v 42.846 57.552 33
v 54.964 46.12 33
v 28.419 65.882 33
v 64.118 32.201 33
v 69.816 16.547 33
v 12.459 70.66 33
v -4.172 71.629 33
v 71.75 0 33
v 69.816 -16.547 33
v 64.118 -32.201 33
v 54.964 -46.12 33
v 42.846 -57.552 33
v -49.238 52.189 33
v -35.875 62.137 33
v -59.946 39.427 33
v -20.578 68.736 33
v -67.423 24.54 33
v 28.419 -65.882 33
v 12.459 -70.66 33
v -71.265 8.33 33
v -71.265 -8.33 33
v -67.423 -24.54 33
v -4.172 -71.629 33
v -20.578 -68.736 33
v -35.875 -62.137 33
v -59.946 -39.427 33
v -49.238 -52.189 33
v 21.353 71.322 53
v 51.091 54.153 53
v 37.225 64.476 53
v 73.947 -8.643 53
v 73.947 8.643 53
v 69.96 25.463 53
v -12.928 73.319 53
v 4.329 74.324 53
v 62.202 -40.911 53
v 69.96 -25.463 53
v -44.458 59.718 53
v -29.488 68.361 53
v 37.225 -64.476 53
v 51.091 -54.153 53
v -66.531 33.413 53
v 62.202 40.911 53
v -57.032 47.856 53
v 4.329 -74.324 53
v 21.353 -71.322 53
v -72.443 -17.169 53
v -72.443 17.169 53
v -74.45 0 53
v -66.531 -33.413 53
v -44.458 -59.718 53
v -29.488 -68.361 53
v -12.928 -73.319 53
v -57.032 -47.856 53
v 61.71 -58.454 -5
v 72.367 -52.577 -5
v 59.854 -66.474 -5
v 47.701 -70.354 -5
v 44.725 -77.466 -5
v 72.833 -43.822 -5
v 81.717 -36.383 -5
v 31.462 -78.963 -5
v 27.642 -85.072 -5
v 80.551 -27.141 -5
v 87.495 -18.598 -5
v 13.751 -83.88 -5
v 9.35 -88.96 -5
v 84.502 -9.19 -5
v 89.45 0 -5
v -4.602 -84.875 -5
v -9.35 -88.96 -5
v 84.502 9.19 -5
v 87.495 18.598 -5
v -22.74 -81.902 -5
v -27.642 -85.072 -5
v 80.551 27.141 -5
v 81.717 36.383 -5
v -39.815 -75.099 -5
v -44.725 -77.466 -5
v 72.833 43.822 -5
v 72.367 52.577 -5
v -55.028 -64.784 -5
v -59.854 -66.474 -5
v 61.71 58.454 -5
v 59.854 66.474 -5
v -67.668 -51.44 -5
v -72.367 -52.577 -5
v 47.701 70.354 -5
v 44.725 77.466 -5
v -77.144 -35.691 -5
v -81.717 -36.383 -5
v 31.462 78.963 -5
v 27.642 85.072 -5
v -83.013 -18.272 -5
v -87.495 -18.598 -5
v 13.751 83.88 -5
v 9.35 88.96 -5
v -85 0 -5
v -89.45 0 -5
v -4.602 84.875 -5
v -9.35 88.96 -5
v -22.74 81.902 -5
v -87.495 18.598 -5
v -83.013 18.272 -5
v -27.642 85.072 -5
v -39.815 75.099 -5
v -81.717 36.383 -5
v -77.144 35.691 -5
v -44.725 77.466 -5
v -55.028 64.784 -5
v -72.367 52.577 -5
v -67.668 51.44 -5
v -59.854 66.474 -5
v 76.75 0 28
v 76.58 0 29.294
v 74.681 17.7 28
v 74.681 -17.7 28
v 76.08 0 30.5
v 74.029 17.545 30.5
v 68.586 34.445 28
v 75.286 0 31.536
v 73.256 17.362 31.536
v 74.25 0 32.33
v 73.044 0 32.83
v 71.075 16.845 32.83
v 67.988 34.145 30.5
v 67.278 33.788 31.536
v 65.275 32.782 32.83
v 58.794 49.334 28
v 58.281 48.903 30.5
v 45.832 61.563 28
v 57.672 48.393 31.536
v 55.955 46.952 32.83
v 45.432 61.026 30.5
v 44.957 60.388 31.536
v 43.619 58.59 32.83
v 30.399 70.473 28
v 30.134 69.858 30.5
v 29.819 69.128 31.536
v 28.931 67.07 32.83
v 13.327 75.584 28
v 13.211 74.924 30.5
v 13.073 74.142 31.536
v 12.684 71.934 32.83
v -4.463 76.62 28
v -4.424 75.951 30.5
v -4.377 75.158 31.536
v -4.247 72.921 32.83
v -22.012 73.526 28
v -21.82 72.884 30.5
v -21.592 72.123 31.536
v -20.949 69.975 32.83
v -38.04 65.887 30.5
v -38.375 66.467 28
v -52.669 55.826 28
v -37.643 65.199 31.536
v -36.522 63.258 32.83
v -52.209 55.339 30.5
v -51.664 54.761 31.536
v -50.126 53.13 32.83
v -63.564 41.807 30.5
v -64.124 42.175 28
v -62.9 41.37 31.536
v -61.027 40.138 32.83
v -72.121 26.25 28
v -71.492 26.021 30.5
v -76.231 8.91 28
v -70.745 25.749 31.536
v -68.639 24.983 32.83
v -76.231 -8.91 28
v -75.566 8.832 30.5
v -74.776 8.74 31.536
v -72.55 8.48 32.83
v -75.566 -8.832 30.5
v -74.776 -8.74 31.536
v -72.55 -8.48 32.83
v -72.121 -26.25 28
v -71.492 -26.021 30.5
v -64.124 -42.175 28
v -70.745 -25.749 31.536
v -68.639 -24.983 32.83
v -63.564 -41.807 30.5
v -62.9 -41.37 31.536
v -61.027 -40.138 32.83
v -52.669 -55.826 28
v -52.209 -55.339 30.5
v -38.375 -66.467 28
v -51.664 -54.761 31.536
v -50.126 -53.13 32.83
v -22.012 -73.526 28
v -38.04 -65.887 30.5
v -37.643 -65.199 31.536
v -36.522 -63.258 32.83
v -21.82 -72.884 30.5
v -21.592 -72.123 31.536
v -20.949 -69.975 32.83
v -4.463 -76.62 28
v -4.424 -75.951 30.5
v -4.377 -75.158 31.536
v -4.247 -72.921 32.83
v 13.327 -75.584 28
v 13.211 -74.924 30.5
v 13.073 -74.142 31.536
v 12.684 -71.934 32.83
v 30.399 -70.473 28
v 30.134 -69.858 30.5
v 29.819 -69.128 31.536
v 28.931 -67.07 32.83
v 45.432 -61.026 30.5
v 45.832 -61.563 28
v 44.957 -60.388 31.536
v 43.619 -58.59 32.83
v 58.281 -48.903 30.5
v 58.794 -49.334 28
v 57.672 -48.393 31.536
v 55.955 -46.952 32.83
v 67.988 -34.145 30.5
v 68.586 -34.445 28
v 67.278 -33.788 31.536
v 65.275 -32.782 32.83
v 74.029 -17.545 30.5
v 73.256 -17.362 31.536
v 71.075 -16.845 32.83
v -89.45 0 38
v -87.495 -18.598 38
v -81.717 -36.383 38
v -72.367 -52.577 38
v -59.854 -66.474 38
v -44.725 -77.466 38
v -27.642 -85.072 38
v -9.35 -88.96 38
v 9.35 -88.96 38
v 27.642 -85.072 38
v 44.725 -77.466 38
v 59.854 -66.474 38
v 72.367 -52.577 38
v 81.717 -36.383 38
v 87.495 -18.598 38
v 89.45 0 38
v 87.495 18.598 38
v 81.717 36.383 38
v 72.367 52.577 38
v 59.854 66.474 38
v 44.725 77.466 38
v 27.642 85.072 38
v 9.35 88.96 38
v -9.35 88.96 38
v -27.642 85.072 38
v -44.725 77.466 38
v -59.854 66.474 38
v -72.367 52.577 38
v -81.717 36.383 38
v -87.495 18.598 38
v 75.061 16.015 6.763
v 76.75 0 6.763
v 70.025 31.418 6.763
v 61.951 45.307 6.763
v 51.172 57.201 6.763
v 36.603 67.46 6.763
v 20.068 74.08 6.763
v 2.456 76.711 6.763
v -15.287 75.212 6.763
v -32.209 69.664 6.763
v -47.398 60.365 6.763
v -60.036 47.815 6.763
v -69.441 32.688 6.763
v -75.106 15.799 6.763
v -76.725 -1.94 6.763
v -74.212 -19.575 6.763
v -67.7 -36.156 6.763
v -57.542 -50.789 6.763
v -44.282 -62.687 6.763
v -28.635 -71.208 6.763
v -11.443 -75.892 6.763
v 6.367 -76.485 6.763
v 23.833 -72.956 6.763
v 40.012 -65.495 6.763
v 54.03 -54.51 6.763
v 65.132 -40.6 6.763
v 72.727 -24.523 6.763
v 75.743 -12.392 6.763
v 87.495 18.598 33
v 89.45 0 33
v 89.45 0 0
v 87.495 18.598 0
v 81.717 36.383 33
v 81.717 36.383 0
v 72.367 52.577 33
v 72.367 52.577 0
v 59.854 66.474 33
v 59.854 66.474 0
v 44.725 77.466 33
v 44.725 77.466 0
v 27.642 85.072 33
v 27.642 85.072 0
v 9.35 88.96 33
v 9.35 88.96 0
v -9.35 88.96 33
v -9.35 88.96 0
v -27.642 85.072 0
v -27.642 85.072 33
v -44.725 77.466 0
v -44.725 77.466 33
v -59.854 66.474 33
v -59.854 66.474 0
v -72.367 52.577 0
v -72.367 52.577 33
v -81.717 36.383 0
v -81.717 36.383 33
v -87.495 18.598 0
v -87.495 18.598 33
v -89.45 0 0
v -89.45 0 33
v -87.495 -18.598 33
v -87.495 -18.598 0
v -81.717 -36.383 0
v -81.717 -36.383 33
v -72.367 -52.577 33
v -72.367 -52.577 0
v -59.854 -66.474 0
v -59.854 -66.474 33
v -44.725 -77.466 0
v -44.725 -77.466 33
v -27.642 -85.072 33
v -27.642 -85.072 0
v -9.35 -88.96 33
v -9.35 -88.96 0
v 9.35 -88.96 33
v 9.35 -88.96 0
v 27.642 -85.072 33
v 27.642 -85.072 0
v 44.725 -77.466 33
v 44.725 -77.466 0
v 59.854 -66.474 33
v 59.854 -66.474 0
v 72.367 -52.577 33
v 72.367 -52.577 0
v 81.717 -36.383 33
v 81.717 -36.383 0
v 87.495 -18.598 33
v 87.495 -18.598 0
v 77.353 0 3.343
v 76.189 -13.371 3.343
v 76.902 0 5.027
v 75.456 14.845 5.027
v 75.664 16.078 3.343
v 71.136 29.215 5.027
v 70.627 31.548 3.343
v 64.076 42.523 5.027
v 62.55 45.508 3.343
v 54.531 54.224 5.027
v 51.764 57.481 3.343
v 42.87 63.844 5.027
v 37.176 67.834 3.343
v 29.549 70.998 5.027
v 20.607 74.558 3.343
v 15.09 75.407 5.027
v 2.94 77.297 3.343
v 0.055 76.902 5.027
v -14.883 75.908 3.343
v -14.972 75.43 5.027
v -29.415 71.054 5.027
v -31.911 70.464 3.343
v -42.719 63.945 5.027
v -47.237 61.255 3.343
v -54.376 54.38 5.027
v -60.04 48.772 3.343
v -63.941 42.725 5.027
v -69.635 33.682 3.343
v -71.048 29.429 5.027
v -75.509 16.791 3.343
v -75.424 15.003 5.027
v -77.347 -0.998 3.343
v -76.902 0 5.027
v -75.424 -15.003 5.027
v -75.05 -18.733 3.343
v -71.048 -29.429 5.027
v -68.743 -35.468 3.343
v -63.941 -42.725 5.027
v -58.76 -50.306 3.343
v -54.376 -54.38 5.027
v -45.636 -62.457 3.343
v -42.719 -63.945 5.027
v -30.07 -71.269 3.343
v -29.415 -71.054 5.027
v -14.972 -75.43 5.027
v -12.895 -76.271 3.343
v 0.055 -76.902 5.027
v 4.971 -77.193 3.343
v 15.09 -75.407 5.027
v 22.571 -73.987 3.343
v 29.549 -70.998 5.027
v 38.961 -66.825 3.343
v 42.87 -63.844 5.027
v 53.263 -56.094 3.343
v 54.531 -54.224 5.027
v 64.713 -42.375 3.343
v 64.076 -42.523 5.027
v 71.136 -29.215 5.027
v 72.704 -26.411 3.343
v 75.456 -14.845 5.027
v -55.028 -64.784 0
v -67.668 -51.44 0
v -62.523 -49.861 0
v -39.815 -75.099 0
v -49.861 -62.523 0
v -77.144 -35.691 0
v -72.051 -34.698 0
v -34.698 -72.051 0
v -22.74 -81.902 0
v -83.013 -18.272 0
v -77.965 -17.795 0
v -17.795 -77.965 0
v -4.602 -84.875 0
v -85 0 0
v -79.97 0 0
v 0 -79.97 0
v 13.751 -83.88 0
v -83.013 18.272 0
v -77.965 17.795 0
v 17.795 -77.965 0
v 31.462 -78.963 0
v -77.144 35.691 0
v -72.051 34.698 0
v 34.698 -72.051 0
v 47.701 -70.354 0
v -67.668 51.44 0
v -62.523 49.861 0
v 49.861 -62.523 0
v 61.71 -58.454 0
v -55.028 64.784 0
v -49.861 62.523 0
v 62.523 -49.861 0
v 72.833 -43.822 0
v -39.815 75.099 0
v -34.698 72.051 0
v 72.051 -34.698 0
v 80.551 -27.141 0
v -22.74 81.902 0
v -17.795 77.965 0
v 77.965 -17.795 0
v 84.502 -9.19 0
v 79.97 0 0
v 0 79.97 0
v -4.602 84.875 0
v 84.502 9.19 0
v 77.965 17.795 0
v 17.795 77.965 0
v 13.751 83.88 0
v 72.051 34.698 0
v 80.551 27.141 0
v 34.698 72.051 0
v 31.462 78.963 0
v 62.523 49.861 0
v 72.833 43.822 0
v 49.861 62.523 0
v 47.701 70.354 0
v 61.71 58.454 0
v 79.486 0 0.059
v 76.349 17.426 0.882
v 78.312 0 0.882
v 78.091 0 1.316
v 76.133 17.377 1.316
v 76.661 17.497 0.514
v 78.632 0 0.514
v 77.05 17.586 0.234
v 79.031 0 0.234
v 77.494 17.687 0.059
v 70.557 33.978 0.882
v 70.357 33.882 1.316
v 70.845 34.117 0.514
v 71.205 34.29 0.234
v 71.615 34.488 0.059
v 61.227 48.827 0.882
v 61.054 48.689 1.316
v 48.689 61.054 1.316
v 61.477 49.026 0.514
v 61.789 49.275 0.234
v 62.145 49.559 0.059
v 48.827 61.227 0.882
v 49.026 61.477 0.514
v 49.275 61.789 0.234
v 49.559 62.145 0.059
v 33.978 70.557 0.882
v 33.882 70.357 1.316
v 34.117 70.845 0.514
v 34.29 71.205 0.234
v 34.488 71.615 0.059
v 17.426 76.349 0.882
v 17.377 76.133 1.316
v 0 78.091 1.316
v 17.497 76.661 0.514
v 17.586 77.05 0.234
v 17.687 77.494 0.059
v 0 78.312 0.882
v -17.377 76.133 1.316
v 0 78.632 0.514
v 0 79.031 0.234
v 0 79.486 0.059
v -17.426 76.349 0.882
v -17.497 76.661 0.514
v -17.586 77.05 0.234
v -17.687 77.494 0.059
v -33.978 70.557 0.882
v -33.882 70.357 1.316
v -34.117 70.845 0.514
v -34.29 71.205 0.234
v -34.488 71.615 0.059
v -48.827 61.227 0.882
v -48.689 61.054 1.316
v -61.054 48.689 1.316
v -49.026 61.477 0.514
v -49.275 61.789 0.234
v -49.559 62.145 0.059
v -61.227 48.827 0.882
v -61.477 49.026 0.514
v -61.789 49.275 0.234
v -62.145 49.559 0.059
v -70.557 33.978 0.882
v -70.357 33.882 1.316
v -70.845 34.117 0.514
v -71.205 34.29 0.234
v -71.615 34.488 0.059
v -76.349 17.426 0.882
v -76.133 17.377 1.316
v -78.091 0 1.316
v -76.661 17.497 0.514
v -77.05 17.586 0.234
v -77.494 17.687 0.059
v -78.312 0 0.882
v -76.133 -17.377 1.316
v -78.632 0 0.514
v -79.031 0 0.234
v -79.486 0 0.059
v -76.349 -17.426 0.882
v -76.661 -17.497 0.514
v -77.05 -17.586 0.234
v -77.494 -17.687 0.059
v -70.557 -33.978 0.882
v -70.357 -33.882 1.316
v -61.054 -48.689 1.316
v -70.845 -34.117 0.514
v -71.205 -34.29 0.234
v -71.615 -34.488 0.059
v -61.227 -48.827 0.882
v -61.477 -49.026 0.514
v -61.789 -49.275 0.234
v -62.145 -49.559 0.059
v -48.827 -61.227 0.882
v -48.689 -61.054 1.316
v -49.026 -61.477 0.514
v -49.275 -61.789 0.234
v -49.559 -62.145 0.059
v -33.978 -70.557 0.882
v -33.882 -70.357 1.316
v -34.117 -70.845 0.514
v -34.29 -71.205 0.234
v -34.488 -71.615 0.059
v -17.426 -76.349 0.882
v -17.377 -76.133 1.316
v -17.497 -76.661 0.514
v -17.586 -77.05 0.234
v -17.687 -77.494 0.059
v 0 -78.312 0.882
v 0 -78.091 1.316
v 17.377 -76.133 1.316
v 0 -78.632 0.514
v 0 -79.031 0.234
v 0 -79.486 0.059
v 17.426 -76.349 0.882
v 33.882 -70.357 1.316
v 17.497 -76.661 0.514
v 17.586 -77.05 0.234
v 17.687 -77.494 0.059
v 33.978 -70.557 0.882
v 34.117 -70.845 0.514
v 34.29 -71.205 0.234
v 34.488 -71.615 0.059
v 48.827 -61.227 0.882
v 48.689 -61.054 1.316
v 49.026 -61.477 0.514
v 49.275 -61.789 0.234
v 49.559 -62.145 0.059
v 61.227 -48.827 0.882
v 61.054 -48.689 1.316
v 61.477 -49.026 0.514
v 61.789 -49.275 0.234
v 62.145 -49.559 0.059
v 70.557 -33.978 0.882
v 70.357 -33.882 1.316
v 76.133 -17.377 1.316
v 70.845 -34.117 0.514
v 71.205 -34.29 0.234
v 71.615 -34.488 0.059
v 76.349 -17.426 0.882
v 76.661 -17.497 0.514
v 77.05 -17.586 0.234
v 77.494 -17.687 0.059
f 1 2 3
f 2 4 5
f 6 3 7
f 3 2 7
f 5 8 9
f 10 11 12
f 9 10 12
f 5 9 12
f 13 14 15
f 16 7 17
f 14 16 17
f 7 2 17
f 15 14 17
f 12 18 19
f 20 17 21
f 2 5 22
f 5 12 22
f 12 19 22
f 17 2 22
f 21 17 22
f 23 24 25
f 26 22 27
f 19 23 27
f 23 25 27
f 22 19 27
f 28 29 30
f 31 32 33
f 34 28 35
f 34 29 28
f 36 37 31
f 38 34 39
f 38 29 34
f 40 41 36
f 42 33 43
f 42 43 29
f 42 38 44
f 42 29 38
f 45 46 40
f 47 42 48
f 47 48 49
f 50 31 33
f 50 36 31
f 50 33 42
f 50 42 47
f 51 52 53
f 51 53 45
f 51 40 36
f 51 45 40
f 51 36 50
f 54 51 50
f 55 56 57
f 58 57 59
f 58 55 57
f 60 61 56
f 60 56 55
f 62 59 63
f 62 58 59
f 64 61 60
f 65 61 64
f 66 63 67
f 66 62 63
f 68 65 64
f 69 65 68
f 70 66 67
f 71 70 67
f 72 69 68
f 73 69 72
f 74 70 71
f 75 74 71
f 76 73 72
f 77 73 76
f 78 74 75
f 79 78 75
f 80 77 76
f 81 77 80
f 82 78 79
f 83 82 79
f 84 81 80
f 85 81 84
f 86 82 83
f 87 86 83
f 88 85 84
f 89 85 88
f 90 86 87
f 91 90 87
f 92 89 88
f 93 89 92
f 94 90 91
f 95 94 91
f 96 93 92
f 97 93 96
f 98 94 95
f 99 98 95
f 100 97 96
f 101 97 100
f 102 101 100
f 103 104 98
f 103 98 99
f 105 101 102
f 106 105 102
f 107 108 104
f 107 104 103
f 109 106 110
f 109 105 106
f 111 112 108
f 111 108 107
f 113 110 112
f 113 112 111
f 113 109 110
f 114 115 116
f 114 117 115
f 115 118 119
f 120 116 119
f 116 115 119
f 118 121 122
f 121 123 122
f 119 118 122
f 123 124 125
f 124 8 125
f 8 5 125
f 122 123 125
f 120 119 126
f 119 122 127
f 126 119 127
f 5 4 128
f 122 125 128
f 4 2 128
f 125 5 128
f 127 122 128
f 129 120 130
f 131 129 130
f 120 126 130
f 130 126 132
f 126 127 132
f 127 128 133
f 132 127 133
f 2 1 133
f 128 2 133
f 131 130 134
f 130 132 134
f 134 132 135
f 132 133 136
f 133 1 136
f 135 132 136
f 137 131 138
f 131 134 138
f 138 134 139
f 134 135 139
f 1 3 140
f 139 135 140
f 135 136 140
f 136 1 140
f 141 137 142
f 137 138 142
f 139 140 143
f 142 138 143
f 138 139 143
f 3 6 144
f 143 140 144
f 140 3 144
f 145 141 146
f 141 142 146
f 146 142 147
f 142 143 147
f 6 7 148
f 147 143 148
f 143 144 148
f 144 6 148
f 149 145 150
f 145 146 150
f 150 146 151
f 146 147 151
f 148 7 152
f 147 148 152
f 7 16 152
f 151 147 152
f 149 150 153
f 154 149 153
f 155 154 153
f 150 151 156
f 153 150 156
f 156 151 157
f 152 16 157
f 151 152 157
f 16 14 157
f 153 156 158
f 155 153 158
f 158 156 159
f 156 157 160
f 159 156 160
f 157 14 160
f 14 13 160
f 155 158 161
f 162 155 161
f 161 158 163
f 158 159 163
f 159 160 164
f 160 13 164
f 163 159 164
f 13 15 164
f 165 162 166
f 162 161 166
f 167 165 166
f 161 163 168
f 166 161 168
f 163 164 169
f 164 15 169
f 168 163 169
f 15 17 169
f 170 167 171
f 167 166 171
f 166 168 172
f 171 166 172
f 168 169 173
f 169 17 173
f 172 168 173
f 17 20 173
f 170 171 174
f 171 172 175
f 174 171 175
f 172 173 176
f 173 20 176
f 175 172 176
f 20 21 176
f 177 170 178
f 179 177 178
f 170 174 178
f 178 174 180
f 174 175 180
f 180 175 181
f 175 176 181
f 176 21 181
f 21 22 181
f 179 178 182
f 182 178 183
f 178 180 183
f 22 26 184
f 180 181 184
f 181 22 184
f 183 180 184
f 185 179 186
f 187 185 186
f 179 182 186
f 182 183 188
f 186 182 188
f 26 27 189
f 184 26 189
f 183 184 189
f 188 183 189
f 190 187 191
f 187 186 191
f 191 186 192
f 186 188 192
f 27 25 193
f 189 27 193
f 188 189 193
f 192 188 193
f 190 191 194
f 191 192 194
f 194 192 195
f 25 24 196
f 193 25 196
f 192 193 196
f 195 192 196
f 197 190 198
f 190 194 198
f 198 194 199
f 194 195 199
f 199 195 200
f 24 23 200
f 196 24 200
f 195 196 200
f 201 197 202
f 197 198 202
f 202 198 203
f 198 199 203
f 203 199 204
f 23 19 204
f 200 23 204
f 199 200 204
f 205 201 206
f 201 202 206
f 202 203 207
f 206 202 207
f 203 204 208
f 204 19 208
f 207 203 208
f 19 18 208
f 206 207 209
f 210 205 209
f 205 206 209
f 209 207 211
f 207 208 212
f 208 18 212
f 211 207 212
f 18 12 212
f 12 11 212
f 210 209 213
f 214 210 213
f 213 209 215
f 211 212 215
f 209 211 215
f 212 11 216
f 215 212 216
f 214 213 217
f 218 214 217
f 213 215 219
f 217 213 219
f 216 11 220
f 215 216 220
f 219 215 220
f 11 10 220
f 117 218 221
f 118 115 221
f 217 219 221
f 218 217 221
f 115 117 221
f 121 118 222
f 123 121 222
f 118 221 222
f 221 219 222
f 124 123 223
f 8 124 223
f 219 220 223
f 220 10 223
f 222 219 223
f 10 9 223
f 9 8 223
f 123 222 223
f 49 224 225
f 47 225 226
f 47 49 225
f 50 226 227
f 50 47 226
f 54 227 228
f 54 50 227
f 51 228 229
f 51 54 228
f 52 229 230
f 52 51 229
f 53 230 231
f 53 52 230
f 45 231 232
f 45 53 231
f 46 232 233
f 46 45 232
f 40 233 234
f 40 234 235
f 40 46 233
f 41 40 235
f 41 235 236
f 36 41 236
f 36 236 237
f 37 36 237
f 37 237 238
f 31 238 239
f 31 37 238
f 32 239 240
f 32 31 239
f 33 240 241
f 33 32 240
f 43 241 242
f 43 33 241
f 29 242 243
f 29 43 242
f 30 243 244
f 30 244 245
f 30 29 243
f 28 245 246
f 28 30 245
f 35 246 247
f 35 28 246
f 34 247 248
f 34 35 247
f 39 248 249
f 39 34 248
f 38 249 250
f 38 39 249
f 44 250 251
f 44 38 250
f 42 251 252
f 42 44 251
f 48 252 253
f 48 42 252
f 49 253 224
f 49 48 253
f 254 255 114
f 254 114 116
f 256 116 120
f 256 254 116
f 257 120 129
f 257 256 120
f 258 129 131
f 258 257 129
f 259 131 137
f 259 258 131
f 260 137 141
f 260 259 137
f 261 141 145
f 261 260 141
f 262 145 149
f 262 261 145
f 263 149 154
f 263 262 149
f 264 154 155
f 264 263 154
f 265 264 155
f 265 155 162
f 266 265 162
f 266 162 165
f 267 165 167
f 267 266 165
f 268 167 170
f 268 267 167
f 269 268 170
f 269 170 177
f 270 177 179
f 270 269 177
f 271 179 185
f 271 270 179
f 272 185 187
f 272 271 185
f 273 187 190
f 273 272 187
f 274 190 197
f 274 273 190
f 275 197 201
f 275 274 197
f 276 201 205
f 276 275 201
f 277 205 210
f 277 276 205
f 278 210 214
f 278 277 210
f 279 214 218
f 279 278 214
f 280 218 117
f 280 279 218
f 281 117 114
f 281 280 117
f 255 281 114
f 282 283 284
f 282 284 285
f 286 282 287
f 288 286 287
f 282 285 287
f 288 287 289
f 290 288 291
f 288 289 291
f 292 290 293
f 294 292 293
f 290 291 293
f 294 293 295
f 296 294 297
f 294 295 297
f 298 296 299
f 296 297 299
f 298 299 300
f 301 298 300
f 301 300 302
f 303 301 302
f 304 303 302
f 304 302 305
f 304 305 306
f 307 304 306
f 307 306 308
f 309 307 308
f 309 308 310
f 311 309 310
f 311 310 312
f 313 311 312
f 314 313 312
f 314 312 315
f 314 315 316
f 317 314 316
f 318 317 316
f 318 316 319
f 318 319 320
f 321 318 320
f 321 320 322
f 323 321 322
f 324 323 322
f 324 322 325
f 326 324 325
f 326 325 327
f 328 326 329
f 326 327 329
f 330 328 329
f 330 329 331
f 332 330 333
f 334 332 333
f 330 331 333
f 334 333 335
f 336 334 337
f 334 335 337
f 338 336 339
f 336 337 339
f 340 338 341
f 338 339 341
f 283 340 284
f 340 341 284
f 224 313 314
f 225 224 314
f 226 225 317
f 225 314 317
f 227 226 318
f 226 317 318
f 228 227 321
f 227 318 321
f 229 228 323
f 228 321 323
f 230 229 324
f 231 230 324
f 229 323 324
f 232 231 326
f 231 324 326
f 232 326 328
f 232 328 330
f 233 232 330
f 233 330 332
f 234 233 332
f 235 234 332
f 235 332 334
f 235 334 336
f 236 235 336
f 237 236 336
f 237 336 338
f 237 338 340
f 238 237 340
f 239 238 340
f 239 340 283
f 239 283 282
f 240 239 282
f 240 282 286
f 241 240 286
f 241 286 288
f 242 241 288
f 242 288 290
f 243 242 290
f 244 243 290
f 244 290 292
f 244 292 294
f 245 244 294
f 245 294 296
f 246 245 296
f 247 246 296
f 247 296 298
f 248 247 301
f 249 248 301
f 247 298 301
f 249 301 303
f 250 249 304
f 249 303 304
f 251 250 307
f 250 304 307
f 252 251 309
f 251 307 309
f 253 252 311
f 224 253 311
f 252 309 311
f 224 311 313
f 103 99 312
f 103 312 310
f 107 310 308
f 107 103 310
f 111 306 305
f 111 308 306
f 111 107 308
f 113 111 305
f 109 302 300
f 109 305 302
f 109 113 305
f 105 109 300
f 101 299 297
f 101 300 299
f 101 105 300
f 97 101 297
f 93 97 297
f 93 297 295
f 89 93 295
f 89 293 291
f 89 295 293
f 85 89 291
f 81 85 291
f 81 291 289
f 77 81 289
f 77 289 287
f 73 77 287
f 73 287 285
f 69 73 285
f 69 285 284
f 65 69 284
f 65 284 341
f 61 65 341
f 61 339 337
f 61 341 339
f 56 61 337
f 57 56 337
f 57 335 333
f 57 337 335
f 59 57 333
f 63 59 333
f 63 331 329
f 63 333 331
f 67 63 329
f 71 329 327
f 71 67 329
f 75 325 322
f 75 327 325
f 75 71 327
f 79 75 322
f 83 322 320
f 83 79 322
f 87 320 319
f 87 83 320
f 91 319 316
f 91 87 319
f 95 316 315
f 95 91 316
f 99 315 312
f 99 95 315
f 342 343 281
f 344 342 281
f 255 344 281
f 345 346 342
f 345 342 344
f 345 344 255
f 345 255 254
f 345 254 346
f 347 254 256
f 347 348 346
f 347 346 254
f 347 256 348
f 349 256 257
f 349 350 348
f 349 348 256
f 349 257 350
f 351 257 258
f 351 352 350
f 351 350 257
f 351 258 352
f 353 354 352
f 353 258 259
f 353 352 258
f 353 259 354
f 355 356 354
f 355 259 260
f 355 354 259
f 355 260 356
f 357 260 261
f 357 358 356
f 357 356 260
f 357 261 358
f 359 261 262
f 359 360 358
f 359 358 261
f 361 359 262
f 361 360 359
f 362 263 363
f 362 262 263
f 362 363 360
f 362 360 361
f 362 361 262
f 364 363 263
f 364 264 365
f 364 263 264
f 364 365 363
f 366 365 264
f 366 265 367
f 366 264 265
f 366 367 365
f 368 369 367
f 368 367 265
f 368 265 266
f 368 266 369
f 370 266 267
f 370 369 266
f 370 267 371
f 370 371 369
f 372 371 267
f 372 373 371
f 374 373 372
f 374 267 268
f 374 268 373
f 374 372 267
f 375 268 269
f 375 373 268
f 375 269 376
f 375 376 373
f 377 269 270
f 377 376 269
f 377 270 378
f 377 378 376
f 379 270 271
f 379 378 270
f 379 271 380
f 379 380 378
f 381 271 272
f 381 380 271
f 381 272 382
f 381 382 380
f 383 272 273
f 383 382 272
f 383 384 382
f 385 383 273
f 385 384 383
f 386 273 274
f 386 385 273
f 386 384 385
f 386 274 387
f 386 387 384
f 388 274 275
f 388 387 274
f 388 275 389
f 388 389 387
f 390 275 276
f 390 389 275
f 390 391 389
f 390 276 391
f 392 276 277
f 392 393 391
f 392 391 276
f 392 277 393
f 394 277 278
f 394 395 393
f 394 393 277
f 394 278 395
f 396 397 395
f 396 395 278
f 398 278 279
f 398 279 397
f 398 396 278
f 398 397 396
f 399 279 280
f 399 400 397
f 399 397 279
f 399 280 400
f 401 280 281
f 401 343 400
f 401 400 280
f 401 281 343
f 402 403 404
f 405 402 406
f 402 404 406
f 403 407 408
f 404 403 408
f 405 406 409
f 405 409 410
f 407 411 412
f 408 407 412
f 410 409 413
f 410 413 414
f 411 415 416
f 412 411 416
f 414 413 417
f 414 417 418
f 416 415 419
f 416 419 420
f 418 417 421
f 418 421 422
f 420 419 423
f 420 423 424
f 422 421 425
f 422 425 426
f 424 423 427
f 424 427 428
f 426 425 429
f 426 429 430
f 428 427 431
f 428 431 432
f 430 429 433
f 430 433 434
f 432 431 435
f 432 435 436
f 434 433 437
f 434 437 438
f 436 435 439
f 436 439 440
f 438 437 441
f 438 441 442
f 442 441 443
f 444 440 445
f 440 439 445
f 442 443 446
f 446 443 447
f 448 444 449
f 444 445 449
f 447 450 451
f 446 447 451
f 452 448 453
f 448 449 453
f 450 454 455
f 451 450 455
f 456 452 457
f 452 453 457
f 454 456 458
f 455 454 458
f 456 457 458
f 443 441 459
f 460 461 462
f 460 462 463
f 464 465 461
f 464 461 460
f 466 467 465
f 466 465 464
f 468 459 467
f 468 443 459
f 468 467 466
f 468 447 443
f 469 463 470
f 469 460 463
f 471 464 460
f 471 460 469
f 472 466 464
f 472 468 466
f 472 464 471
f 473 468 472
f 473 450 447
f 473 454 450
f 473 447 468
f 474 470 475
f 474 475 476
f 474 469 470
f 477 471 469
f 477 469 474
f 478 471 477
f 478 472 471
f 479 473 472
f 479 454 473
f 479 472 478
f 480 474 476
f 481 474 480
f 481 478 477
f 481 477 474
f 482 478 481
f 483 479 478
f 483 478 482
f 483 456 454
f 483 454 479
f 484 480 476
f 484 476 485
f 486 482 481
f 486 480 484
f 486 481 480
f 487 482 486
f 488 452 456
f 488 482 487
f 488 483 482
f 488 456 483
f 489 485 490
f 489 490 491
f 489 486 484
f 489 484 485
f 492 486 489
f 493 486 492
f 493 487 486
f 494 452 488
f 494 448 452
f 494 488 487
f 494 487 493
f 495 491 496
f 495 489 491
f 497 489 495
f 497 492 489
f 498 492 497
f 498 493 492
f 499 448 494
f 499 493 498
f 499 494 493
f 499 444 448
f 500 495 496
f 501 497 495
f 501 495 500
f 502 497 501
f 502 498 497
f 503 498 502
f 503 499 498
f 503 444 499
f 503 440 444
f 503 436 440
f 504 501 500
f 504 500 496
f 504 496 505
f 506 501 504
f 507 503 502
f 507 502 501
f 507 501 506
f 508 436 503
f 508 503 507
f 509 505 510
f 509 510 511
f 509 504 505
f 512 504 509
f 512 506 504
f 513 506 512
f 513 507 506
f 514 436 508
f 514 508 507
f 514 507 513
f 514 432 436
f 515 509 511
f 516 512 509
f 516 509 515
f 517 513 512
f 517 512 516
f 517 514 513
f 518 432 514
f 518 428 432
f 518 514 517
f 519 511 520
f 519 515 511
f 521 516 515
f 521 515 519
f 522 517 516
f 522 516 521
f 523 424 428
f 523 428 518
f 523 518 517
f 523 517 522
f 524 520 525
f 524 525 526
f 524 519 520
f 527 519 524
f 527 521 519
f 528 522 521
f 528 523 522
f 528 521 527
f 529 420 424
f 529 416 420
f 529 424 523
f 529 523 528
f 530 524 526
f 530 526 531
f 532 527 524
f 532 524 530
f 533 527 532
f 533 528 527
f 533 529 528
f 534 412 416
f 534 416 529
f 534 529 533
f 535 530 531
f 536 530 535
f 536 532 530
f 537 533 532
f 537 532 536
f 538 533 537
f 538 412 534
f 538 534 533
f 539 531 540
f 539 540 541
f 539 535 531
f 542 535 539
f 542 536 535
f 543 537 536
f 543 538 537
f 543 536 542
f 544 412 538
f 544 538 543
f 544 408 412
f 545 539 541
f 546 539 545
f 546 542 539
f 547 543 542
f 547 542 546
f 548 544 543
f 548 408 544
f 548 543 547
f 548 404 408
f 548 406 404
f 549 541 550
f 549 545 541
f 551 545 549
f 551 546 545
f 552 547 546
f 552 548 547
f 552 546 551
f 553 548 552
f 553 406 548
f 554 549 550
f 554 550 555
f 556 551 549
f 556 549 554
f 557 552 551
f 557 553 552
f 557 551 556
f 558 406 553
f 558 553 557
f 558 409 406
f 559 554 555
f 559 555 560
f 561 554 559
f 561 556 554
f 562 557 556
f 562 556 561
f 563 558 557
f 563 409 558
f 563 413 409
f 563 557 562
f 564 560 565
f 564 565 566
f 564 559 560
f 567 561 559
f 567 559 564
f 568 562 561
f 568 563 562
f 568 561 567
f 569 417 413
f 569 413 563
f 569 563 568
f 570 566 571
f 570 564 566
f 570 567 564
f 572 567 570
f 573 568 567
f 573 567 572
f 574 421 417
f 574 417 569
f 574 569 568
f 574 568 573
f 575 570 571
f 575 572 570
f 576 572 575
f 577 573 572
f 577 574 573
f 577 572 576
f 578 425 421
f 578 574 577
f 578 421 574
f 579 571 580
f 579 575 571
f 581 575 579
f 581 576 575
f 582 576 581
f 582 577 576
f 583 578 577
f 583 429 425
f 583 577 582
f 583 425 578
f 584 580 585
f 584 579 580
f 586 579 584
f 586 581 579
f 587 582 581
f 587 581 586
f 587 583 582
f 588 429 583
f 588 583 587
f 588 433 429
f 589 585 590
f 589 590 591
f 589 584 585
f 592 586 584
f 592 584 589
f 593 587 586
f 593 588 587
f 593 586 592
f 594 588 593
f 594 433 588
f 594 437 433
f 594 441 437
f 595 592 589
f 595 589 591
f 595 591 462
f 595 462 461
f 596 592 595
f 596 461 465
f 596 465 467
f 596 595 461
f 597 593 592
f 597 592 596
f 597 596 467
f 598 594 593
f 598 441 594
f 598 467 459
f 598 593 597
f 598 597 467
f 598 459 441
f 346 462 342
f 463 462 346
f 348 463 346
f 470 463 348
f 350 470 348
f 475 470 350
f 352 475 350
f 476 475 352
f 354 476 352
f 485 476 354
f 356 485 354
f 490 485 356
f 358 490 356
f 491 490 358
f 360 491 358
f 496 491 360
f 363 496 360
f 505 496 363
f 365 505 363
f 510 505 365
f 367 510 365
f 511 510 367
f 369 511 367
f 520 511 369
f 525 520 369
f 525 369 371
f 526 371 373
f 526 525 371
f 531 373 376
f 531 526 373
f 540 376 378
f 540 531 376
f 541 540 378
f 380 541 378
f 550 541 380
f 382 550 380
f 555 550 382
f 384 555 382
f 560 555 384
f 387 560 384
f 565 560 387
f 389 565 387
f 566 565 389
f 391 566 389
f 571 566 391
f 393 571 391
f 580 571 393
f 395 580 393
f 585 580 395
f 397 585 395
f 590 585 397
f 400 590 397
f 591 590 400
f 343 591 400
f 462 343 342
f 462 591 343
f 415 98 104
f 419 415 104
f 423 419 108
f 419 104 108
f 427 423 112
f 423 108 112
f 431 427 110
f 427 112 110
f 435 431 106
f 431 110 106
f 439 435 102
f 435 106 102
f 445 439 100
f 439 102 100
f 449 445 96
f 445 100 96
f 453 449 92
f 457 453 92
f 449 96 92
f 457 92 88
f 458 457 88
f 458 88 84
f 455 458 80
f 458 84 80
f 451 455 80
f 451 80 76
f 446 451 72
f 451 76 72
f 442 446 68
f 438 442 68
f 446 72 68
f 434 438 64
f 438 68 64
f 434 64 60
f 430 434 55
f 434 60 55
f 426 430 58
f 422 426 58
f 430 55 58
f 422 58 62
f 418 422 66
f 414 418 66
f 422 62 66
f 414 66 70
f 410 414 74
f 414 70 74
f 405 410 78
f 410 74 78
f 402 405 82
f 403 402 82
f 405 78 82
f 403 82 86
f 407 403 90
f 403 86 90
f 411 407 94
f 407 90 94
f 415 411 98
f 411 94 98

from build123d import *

# Parameters (mm, degrees)
SKETCH1_R           = 89.45
SKETCH1_R_2         = 76.75
BOSS_EXTRUDE1_DEPTH = 33
BOSS_EXTRUDE2_START = 5
SKETCH2_R           = 89.45
SKETCH2_R_2         = 85
BOSS_EXTRUDE2_DEPTH = 5
SKETCH3_R           = 89.45
BOSS_EXTRUDE3_DEPTH = 20
CHAMFER1_SIZE       = 15
CHAMFER2_SIZE       = 5
CHAMFER2_SIZE2      = 1.819851171
FILLET1_R           = 10
FILLET2_R           = 2
FILLET3_R           = 5


with BuildPart() as part:
    # Sketch1 → Boss-Extrude1 (new body)
    with BuildSketch(Plane.XY):
        Circle(SKETCH1_R)
        Circle(SKETCH1_R_2, mode=Mode.SUBTRACT)
    extrude(amount=BOSS_EXTRUDE1_DEPTH)

    # Sketch2 → Boss-Extrude2 (add)
    with BuildSketch(Plane(origin=(0, 0, 0), x_dir=(-1, 0, 0), z_dir=(0, 0, -1)).offset(BOSS_EXTRUDE2_START)):
        Circle(SKETCH2_R)
        Circle(SKETCH2_R_2, mode=Mode.SUBTRACT)
    extrude(amount=-BOSS_EXTRUDE2_DEPTH)

    # Sketch3 → Boss-Extrude3 (add)
    with BuildSketch(Plane.XY.offset(33)):
        with Locations(Location((0, 0, 0), (0, 0, 180))):
            Circle(SKETCH3_R)
    extrude(amount=BOSS_EXTRUDE3_DEPTH)

    # Chamfer1
    chamfer1_edges = [part.edges().sort_by_distance(p)[0] for p in [
        (89.45, 0, 53),
    ]]
    chamfer(chamfer1_edges, length=CHAMFER1_SIZE)

    # Chamfer2
    chamfer2_edges = [part.edges().sort_by_distance(p)[0] for p in [
        (-76.75, 0, 0),
    ]]
    chamfer2_side = [part.faces().sort_by_distance(p)[0] for p in [
        (-76.75, 0, 16.5),
    ]]
    chamfer(chamfer2_edges, length=CHAMFER2_SIZE, length2=CHAMFER2_SIZE2, reference=chamfer2_side[0])

    # Fillet1
    fillet1_edges = [part.edges().sort_by_distance(p)[0] for p in [
        (-76.75, 0, 5),
    ]]
    fillet(fillet1_edges, radius=FILLET1_R)

    # Fillet2
    fillet2_edges = [part.edges().sort_by_distance(p)[0] for p in [
        (-78.569851171, 0, 0),
    ]]
    fillet(fillet2_edges, radius=FILLET2_R)

    # Fillet3
    fillet3_edges = [part.edges().sort_by_distance(p)[0] for p in [
        (-76.75, 0, 33),
    ]]
    fillet(fillet3_edges, radius=FILLET3_R)


solid = part.part
